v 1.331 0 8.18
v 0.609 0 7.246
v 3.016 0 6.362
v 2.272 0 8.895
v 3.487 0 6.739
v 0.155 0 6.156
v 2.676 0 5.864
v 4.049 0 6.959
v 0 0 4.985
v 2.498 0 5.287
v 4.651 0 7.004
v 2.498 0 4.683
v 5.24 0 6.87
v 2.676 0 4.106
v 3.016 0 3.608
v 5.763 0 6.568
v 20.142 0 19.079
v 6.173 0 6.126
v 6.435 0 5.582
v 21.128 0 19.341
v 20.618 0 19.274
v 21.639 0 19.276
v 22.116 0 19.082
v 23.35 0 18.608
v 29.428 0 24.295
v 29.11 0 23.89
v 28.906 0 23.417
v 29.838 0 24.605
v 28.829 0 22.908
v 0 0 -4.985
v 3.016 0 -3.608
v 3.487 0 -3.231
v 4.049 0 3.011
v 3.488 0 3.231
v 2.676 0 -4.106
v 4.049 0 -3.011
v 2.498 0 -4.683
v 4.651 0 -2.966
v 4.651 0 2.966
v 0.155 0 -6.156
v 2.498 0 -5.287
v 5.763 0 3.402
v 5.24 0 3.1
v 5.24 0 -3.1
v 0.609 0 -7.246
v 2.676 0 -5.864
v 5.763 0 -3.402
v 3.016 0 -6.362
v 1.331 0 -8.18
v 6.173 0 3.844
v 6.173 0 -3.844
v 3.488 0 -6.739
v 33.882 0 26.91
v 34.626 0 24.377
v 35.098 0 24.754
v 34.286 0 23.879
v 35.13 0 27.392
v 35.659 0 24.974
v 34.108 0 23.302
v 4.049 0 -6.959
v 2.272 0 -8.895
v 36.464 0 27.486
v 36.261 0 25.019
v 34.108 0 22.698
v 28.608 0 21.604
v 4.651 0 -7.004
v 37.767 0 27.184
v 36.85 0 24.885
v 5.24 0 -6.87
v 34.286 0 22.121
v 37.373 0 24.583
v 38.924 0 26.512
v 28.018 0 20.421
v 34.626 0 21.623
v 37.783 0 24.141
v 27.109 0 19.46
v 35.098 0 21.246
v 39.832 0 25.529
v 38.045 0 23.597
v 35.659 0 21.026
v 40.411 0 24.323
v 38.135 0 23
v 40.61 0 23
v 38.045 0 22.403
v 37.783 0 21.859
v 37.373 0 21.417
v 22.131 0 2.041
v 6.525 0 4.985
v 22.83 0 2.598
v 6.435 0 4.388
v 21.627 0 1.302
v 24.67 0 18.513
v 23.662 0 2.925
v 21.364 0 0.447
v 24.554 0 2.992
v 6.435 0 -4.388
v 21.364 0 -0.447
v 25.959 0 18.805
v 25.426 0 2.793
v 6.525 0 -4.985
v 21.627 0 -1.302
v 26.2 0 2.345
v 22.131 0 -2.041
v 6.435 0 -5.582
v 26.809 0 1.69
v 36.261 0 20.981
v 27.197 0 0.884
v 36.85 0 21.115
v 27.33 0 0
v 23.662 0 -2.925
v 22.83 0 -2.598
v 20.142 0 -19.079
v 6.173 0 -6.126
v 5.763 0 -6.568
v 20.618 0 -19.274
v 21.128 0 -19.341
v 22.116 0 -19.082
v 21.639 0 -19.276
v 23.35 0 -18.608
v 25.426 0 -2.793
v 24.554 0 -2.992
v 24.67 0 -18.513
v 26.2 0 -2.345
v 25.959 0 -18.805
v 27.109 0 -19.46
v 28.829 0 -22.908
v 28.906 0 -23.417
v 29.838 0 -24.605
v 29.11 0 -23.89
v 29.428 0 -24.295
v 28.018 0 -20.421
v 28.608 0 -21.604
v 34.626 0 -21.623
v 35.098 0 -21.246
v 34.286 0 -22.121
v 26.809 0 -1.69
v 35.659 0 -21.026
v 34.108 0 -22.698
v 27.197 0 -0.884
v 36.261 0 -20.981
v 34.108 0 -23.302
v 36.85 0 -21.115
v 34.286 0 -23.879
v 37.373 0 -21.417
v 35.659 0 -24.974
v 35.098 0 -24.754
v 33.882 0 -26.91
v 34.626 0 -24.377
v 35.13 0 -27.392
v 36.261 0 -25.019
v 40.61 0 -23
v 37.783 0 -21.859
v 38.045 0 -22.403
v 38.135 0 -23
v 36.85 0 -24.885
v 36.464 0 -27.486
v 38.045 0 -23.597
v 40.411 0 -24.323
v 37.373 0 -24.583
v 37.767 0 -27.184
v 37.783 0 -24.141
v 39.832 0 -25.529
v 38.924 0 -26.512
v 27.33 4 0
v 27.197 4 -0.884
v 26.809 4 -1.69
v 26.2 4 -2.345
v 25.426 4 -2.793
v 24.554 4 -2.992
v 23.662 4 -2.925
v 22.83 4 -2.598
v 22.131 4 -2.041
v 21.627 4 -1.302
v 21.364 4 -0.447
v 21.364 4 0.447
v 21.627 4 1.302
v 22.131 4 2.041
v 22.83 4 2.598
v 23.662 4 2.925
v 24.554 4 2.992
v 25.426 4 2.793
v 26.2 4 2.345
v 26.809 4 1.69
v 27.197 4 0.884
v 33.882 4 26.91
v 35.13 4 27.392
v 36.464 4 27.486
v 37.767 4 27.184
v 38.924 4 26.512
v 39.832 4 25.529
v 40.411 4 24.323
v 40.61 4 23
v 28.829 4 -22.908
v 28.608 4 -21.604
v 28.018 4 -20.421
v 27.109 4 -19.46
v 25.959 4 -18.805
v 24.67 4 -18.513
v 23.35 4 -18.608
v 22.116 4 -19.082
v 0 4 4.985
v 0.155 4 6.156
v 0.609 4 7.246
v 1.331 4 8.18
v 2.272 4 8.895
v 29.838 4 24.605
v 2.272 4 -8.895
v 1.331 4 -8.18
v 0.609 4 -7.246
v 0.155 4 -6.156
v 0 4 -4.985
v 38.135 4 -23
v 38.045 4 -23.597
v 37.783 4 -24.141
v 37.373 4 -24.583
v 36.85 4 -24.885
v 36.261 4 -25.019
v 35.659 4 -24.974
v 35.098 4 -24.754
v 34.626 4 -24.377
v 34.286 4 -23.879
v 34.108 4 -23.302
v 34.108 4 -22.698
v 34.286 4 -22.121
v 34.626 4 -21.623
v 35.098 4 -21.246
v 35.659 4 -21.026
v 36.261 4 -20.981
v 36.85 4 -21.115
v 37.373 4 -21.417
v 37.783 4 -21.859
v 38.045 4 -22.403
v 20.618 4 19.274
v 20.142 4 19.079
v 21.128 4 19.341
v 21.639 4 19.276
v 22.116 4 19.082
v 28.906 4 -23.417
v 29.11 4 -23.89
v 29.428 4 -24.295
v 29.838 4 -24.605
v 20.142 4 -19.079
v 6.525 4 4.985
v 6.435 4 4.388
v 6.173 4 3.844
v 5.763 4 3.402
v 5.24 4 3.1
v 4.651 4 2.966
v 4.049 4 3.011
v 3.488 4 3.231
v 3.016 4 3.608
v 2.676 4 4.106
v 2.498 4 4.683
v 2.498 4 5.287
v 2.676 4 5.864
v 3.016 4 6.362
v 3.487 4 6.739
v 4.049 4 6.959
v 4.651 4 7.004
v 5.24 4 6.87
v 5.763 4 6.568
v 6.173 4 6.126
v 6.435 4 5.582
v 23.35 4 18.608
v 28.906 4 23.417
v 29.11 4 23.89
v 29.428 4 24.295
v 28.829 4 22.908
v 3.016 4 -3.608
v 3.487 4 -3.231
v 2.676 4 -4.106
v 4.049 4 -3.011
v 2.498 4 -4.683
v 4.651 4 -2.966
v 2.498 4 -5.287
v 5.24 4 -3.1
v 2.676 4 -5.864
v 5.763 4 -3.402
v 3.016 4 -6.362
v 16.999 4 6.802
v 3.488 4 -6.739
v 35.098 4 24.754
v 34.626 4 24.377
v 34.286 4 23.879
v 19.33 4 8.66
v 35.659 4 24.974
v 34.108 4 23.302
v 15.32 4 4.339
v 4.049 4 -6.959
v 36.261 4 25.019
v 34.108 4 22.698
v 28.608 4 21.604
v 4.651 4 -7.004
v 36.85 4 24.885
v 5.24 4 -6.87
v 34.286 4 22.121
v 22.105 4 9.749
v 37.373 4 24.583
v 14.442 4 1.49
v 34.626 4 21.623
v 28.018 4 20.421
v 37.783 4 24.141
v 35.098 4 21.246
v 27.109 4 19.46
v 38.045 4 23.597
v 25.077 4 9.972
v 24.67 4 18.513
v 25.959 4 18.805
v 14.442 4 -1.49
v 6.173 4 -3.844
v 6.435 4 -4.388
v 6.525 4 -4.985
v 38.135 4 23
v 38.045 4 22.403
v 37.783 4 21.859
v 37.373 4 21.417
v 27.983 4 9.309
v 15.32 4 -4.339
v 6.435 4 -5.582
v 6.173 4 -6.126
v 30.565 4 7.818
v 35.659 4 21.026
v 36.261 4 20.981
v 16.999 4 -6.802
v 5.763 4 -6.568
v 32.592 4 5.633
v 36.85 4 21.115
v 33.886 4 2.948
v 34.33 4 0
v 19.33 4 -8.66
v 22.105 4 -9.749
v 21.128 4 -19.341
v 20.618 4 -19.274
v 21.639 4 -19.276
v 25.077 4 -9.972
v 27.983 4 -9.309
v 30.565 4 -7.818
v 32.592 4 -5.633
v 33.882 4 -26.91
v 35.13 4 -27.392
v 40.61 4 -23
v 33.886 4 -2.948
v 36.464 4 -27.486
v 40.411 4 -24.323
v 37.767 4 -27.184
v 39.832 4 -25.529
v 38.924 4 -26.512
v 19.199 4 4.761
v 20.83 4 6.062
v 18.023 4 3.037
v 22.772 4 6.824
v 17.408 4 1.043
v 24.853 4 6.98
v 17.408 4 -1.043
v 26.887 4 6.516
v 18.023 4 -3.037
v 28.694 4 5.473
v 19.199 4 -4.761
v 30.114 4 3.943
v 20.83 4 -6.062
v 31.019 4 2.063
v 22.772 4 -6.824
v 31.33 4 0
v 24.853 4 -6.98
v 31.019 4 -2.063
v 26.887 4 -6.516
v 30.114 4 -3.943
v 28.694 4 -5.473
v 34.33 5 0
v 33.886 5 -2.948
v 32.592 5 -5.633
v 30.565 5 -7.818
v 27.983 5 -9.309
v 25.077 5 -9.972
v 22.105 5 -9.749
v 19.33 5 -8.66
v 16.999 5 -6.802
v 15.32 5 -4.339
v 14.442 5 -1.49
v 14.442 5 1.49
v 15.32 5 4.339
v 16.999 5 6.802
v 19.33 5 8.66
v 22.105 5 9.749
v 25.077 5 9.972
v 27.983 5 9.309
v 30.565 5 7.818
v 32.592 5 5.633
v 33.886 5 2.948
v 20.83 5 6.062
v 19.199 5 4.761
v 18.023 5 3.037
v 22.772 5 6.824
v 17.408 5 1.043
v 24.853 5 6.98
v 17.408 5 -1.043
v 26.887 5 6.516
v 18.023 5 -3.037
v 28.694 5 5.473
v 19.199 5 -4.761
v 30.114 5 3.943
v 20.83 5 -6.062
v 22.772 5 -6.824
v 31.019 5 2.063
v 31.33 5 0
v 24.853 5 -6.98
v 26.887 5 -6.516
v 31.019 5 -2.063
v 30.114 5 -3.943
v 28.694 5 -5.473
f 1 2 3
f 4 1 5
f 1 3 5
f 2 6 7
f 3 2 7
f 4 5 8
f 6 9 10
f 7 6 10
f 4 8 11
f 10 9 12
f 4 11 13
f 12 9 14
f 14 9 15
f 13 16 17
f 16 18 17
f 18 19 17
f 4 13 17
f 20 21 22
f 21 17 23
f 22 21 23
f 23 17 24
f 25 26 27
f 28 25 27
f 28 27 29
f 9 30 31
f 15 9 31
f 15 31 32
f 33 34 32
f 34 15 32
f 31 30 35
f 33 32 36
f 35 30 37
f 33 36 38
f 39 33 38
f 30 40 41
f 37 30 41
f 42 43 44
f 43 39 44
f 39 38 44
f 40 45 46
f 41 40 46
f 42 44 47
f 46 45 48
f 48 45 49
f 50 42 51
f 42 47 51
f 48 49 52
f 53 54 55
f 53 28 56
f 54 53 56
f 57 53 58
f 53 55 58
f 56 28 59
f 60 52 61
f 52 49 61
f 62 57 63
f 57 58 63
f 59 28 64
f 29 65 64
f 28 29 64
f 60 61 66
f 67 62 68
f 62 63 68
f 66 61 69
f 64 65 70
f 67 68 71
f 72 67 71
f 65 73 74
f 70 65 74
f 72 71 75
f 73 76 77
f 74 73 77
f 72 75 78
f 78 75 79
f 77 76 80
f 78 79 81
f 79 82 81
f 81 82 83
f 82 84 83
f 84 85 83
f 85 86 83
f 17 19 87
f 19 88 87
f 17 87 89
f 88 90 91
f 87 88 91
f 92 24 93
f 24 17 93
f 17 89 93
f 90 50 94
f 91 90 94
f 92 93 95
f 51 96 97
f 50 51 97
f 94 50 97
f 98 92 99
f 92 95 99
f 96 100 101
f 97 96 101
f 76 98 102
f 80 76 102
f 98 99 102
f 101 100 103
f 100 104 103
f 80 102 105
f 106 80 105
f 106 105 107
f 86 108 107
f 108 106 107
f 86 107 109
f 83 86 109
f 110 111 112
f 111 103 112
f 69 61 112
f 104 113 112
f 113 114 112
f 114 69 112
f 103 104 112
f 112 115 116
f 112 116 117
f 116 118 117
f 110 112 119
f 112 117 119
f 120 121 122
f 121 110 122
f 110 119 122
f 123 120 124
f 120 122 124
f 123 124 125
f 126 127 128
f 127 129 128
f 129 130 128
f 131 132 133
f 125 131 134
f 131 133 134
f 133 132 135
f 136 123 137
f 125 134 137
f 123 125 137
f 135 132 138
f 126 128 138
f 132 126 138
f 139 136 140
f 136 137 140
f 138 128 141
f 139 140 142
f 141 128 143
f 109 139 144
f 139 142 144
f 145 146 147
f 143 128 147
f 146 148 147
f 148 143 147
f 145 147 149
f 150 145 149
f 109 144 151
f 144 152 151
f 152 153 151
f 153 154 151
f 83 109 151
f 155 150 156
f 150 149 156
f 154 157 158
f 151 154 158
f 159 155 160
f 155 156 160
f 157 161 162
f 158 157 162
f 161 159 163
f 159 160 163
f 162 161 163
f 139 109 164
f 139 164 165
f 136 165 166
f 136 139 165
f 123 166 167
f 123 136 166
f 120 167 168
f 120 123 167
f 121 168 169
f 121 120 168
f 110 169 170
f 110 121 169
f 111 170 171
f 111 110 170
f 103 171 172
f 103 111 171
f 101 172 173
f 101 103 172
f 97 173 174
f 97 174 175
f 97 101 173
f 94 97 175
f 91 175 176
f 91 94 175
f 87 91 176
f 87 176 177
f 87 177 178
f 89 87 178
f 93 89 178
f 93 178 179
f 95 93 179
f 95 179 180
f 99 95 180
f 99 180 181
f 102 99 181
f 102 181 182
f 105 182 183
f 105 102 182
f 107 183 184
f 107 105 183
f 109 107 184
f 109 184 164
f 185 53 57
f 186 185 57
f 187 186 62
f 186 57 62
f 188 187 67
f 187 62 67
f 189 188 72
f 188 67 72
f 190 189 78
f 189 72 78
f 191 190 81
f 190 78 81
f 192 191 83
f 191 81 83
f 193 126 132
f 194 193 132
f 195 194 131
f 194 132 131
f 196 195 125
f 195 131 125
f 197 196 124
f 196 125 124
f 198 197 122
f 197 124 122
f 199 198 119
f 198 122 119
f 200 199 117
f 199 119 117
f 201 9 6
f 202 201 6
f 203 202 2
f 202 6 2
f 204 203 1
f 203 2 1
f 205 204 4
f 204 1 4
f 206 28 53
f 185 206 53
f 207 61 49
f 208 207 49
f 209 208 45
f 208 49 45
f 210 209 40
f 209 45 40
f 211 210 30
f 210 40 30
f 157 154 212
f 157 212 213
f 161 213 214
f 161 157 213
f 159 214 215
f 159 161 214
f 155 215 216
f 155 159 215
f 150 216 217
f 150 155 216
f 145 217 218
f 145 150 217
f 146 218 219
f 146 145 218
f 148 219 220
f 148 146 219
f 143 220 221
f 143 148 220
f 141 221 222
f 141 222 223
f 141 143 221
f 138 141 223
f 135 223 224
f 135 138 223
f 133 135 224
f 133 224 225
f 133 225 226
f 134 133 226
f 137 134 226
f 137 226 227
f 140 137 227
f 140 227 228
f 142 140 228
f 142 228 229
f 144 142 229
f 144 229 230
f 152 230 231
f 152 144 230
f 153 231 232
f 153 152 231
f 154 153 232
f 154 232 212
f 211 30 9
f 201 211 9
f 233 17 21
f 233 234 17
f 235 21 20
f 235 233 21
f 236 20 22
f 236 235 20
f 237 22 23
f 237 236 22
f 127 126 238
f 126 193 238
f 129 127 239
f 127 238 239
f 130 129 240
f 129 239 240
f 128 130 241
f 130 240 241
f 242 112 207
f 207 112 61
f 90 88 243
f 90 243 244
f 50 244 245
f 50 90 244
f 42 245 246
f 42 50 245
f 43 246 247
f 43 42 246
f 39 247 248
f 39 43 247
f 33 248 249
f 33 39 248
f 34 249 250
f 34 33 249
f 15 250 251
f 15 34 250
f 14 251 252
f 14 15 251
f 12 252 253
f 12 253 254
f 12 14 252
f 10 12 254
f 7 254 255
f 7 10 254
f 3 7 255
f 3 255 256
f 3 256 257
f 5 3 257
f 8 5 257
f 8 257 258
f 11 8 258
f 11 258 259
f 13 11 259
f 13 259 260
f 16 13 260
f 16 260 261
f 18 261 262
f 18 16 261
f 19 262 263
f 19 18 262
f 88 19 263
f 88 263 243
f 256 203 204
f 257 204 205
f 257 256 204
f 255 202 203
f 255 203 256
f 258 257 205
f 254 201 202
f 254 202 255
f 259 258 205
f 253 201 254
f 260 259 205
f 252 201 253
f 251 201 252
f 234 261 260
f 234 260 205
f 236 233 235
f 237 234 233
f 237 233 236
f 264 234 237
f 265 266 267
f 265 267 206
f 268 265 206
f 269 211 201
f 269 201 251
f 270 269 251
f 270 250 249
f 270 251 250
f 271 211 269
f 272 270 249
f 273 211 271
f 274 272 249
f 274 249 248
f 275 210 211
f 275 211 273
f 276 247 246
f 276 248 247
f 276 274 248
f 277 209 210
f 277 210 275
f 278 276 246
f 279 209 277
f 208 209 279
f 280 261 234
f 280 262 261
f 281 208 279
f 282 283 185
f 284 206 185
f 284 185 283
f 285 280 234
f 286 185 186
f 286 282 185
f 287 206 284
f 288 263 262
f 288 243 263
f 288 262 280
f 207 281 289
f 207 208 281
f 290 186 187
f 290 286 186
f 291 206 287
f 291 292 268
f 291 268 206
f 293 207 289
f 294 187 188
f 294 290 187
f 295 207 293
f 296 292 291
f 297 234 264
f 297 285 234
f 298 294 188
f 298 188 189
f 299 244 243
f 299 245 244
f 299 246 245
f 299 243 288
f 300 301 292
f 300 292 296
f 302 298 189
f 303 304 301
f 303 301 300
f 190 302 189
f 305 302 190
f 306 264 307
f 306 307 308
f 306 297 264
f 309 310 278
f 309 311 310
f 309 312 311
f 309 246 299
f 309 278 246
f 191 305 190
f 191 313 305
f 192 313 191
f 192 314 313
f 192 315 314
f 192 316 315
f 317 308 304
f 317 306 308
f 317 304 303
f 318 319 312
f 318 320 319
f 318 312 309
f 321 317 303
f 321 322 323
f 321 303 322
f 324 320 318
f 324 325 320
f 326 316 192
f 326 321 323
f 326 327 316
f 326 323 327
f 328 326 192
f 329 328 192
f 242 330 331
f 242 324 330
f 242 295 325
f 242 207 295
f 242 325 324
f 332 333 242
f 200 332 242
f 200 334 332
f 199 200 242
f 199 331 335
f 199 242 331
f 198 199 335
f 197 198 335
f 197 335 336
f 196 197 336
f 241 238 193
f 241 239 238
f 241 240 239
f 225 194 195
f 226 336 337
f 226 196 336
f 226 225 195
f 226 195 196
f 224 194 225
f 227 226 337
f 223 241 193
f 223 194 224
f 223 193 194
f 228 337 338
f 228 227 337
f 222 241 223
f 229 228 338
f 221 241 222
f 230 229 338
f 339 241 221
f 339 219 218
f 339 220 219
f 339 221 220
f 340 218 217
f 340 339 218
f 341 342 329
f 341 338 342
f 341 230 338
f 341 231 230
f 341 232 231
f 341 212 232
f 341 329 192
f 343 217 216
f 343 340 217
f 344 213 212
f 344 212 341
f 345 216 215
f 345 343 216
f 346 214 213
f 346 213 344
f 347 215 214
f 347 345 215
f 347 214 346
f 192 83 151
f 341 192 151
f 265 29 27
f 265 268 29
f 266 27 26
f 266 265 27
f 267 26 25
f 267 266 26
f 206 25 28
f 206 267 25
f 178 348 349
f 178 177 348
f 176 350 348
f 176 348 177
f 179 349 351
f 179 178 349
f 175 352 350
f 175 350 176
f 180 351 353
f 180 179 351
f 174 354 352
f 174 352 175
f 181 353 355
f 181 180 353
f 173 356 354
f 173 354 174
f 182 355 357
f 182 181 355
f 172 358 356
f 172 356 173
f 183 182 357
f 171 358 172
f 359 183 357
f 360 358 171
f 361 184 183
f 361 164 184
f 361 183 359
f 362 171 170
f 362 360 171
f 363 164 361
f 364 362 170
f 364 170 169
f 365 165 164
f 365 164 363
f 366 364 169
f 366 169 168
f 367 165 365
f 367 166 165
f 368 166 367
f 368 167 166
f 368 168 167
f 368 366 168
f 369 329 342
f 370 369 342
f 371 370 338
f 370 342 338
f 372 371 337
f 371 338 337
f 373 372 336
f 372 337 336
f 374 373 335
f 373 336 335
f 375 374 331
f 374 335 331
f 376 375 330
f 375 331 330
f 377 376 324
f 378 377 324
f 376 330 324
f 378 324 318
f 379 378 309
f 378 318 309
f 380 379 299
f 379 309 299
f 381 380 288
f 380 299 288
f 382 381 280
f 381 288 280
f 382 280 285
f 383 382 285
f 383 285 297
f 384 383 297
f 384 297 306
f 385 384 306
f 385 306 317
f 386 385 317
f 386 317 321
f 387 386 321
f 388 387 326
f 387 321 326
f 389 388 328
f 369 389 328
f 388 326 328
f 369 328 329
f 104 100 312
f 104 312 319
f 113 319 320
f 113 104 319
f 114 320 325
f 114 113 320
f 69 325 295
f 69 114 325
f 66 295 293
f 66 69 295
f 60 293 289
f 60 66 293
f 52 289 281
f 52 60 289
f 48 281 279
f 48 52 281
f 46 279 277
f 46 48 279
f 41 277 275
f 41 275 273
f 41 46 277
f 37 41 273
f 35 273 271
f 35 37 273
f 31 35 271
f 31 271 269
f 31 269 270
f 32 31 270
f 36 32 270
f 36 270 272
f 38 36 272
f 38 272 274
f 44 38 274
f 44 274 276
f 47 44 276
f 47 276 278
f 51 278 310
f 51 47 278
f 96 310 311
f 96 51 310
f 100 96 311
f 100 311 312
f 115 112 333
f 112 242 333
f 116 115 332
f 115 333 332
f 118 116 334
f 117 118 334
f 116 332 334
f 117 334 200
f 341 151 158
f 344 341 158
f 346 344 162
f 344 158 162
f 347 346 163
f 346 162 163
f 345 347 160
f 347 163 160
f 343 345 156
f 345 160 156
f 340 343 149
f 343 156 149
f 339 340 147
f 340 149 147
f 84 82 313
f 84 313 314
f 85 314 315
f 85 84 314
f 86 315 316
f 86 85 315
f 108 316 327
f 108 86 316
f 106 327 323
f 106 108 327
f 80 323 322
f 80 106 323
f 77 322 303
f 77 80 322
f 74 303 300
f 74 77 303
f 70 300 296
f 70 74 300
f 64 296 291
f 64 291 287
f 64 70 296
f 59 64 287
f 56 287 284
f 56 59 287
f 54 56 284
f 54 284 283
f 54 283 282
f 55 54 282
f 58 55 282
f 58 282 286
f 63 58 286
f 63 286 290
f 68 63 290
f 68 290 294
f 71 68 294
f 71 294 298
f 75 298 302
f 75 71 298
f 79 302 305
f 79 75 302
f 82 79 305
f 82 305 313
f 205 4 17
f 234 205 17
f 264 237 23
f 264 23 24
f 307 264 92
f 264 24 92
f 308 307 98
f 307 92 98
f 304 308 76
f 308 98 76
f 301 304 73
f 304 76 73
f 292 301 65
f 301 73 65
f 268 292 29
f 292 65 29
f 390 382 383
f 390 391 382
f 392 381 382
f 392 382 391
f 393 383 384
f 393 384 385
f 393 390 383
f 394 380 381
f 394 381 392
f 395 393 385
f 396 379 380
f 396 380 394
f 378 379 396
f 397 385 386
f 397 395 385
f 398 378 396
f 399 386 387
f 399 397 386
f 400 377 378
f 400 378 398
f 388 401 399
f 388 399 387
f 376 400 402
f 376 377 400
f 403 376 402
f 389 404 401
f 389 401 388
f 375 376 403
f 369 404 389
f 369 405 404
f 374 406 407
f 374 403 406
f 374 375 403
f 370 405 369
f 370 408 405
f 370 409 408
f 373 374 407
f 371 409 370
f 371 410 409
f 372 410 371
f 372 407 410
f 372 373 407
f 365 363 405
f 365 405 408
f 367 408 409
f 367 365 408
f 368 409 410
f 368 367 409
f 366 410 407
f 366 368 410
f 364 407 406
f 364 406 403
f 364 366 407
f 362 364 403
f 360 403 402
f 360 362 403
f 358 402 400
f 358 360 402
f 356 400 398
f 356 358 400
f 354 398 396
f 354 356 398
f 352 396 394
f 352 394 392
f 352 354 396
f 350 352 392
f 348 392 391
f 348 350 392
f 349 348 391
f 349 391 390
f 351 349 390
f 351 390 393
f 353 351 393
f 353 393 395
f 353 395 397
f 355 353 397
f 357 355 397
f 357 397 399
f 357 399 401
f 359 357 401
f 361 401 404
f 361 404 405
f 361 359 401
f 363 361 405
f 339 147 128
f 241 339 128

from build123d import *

# Parameters (mm, degrees)
SKETCH1_R           = 2.025
SKETCH1_R_2         = 3
BOSS_EXTRUDE1_DEPTH = 4
SKETCH2_R           = 10
SKETCH2_R_2         = 7
BOSS_EXTRUDE2_DEPTH = 1
FILLET1_R           = 2


with BuildPart() as part:
    # Sketch1 → Boss-Extrude1 (new body)
    with BuildSketch(Plane(origin=(0, 0, 0), x_dir=(1, 0, 0), z_dir=(0, 1, 0))):
        with BuildLine():
            Line((2.27183836, -8.894641378), (21.255729613, -19.713837864))
            ThreePointArc((21.255729613, -19.713837864), (26.55816164, -19.090358622), (28.724166028, -23.970208697))
            Line((28.724166028, -23.970208697), (33.88183836, -26.909641378))
            ThreePointArc((33.88183836, -26.909641378), (38.370892813, -26.890805018), (40.61, -23))
            Line((40.61, -23), (40.61, 23))
            ThreePointArc((40.61, 23), (38.370892813, 26.890805018), (33.88183836, 26.909641378))
            Line((33.88183836, 26.909641378), (28.724166028, 23.970208697))
            ThreePointArc((28.724166028, 23.970208697), (26.55816164, 19.090358622), (21.255729613, 19.713837864))
            Line((21.255729613, 19.713837864), (2.27183836, 8.894641378))
            ThreePointArc((2.27183836, 8.894641378), (0.609194982, 7.245892813), (0, 4.985))
            Line((0, 4.985), (0, -4.985))
            ThreePointArc((0, -4.985), (0.609194982, -7.245892813), (2.27183836, -8.894641378))
        make_face()
        with Locations((36.11, -23)):
            Circle(SKETCH1_R, mode=Mode.SUBTRACT)
        with Locations((36.11, 23)):
            Circle(SKETCH1_R, mode=Mode.SUBTRACT)
        with Locations((4.5, 4.985)):
            Circle(SKETCH1_R, mode=Mode.SUBTRACT)
        with Locations((4.5, -4.985)):
            Circle(SKETCH1_R, mode=Mode.SUBTRACT)
        with Locations((24.33, 0)):
            Circle(SKETCH1_R_2, mode=Mode.SUBTRACT)
    extrude(amount=BOSS_EXTRUDE1_DEPTH)

    # Sketch2 → Boss-Extrude2 (add)
    with BuildSketch(Plane(origin=(0, 4, 0), x_dir=(1, 0, 0), z_dir=(0, 1, 0))):
        with Locations((24.33, 0)):
            Circle(SKETCH2_R)
        with Locations((24.33, 0)):
            Circle(SKETCH2_R_2, mode=Mode.SUBTRACT)
    extrude(amount=BOSS_EXTRUDE2_DEPTH)

    # Fillet1
    fillet1_edges = [part.edges().sort_by_distance(p)[0] for p in [
        (21.255729613, 2, -19.713837864),
        (28.724166028, 2, -23.970208697),
        (28.724166028, 2, 23.970208697),
        (21.255729613, 2, 19.713837864),
    ]]
    fillet(fillet1_edges, radius=FILLET1_R)


solid = part.part
